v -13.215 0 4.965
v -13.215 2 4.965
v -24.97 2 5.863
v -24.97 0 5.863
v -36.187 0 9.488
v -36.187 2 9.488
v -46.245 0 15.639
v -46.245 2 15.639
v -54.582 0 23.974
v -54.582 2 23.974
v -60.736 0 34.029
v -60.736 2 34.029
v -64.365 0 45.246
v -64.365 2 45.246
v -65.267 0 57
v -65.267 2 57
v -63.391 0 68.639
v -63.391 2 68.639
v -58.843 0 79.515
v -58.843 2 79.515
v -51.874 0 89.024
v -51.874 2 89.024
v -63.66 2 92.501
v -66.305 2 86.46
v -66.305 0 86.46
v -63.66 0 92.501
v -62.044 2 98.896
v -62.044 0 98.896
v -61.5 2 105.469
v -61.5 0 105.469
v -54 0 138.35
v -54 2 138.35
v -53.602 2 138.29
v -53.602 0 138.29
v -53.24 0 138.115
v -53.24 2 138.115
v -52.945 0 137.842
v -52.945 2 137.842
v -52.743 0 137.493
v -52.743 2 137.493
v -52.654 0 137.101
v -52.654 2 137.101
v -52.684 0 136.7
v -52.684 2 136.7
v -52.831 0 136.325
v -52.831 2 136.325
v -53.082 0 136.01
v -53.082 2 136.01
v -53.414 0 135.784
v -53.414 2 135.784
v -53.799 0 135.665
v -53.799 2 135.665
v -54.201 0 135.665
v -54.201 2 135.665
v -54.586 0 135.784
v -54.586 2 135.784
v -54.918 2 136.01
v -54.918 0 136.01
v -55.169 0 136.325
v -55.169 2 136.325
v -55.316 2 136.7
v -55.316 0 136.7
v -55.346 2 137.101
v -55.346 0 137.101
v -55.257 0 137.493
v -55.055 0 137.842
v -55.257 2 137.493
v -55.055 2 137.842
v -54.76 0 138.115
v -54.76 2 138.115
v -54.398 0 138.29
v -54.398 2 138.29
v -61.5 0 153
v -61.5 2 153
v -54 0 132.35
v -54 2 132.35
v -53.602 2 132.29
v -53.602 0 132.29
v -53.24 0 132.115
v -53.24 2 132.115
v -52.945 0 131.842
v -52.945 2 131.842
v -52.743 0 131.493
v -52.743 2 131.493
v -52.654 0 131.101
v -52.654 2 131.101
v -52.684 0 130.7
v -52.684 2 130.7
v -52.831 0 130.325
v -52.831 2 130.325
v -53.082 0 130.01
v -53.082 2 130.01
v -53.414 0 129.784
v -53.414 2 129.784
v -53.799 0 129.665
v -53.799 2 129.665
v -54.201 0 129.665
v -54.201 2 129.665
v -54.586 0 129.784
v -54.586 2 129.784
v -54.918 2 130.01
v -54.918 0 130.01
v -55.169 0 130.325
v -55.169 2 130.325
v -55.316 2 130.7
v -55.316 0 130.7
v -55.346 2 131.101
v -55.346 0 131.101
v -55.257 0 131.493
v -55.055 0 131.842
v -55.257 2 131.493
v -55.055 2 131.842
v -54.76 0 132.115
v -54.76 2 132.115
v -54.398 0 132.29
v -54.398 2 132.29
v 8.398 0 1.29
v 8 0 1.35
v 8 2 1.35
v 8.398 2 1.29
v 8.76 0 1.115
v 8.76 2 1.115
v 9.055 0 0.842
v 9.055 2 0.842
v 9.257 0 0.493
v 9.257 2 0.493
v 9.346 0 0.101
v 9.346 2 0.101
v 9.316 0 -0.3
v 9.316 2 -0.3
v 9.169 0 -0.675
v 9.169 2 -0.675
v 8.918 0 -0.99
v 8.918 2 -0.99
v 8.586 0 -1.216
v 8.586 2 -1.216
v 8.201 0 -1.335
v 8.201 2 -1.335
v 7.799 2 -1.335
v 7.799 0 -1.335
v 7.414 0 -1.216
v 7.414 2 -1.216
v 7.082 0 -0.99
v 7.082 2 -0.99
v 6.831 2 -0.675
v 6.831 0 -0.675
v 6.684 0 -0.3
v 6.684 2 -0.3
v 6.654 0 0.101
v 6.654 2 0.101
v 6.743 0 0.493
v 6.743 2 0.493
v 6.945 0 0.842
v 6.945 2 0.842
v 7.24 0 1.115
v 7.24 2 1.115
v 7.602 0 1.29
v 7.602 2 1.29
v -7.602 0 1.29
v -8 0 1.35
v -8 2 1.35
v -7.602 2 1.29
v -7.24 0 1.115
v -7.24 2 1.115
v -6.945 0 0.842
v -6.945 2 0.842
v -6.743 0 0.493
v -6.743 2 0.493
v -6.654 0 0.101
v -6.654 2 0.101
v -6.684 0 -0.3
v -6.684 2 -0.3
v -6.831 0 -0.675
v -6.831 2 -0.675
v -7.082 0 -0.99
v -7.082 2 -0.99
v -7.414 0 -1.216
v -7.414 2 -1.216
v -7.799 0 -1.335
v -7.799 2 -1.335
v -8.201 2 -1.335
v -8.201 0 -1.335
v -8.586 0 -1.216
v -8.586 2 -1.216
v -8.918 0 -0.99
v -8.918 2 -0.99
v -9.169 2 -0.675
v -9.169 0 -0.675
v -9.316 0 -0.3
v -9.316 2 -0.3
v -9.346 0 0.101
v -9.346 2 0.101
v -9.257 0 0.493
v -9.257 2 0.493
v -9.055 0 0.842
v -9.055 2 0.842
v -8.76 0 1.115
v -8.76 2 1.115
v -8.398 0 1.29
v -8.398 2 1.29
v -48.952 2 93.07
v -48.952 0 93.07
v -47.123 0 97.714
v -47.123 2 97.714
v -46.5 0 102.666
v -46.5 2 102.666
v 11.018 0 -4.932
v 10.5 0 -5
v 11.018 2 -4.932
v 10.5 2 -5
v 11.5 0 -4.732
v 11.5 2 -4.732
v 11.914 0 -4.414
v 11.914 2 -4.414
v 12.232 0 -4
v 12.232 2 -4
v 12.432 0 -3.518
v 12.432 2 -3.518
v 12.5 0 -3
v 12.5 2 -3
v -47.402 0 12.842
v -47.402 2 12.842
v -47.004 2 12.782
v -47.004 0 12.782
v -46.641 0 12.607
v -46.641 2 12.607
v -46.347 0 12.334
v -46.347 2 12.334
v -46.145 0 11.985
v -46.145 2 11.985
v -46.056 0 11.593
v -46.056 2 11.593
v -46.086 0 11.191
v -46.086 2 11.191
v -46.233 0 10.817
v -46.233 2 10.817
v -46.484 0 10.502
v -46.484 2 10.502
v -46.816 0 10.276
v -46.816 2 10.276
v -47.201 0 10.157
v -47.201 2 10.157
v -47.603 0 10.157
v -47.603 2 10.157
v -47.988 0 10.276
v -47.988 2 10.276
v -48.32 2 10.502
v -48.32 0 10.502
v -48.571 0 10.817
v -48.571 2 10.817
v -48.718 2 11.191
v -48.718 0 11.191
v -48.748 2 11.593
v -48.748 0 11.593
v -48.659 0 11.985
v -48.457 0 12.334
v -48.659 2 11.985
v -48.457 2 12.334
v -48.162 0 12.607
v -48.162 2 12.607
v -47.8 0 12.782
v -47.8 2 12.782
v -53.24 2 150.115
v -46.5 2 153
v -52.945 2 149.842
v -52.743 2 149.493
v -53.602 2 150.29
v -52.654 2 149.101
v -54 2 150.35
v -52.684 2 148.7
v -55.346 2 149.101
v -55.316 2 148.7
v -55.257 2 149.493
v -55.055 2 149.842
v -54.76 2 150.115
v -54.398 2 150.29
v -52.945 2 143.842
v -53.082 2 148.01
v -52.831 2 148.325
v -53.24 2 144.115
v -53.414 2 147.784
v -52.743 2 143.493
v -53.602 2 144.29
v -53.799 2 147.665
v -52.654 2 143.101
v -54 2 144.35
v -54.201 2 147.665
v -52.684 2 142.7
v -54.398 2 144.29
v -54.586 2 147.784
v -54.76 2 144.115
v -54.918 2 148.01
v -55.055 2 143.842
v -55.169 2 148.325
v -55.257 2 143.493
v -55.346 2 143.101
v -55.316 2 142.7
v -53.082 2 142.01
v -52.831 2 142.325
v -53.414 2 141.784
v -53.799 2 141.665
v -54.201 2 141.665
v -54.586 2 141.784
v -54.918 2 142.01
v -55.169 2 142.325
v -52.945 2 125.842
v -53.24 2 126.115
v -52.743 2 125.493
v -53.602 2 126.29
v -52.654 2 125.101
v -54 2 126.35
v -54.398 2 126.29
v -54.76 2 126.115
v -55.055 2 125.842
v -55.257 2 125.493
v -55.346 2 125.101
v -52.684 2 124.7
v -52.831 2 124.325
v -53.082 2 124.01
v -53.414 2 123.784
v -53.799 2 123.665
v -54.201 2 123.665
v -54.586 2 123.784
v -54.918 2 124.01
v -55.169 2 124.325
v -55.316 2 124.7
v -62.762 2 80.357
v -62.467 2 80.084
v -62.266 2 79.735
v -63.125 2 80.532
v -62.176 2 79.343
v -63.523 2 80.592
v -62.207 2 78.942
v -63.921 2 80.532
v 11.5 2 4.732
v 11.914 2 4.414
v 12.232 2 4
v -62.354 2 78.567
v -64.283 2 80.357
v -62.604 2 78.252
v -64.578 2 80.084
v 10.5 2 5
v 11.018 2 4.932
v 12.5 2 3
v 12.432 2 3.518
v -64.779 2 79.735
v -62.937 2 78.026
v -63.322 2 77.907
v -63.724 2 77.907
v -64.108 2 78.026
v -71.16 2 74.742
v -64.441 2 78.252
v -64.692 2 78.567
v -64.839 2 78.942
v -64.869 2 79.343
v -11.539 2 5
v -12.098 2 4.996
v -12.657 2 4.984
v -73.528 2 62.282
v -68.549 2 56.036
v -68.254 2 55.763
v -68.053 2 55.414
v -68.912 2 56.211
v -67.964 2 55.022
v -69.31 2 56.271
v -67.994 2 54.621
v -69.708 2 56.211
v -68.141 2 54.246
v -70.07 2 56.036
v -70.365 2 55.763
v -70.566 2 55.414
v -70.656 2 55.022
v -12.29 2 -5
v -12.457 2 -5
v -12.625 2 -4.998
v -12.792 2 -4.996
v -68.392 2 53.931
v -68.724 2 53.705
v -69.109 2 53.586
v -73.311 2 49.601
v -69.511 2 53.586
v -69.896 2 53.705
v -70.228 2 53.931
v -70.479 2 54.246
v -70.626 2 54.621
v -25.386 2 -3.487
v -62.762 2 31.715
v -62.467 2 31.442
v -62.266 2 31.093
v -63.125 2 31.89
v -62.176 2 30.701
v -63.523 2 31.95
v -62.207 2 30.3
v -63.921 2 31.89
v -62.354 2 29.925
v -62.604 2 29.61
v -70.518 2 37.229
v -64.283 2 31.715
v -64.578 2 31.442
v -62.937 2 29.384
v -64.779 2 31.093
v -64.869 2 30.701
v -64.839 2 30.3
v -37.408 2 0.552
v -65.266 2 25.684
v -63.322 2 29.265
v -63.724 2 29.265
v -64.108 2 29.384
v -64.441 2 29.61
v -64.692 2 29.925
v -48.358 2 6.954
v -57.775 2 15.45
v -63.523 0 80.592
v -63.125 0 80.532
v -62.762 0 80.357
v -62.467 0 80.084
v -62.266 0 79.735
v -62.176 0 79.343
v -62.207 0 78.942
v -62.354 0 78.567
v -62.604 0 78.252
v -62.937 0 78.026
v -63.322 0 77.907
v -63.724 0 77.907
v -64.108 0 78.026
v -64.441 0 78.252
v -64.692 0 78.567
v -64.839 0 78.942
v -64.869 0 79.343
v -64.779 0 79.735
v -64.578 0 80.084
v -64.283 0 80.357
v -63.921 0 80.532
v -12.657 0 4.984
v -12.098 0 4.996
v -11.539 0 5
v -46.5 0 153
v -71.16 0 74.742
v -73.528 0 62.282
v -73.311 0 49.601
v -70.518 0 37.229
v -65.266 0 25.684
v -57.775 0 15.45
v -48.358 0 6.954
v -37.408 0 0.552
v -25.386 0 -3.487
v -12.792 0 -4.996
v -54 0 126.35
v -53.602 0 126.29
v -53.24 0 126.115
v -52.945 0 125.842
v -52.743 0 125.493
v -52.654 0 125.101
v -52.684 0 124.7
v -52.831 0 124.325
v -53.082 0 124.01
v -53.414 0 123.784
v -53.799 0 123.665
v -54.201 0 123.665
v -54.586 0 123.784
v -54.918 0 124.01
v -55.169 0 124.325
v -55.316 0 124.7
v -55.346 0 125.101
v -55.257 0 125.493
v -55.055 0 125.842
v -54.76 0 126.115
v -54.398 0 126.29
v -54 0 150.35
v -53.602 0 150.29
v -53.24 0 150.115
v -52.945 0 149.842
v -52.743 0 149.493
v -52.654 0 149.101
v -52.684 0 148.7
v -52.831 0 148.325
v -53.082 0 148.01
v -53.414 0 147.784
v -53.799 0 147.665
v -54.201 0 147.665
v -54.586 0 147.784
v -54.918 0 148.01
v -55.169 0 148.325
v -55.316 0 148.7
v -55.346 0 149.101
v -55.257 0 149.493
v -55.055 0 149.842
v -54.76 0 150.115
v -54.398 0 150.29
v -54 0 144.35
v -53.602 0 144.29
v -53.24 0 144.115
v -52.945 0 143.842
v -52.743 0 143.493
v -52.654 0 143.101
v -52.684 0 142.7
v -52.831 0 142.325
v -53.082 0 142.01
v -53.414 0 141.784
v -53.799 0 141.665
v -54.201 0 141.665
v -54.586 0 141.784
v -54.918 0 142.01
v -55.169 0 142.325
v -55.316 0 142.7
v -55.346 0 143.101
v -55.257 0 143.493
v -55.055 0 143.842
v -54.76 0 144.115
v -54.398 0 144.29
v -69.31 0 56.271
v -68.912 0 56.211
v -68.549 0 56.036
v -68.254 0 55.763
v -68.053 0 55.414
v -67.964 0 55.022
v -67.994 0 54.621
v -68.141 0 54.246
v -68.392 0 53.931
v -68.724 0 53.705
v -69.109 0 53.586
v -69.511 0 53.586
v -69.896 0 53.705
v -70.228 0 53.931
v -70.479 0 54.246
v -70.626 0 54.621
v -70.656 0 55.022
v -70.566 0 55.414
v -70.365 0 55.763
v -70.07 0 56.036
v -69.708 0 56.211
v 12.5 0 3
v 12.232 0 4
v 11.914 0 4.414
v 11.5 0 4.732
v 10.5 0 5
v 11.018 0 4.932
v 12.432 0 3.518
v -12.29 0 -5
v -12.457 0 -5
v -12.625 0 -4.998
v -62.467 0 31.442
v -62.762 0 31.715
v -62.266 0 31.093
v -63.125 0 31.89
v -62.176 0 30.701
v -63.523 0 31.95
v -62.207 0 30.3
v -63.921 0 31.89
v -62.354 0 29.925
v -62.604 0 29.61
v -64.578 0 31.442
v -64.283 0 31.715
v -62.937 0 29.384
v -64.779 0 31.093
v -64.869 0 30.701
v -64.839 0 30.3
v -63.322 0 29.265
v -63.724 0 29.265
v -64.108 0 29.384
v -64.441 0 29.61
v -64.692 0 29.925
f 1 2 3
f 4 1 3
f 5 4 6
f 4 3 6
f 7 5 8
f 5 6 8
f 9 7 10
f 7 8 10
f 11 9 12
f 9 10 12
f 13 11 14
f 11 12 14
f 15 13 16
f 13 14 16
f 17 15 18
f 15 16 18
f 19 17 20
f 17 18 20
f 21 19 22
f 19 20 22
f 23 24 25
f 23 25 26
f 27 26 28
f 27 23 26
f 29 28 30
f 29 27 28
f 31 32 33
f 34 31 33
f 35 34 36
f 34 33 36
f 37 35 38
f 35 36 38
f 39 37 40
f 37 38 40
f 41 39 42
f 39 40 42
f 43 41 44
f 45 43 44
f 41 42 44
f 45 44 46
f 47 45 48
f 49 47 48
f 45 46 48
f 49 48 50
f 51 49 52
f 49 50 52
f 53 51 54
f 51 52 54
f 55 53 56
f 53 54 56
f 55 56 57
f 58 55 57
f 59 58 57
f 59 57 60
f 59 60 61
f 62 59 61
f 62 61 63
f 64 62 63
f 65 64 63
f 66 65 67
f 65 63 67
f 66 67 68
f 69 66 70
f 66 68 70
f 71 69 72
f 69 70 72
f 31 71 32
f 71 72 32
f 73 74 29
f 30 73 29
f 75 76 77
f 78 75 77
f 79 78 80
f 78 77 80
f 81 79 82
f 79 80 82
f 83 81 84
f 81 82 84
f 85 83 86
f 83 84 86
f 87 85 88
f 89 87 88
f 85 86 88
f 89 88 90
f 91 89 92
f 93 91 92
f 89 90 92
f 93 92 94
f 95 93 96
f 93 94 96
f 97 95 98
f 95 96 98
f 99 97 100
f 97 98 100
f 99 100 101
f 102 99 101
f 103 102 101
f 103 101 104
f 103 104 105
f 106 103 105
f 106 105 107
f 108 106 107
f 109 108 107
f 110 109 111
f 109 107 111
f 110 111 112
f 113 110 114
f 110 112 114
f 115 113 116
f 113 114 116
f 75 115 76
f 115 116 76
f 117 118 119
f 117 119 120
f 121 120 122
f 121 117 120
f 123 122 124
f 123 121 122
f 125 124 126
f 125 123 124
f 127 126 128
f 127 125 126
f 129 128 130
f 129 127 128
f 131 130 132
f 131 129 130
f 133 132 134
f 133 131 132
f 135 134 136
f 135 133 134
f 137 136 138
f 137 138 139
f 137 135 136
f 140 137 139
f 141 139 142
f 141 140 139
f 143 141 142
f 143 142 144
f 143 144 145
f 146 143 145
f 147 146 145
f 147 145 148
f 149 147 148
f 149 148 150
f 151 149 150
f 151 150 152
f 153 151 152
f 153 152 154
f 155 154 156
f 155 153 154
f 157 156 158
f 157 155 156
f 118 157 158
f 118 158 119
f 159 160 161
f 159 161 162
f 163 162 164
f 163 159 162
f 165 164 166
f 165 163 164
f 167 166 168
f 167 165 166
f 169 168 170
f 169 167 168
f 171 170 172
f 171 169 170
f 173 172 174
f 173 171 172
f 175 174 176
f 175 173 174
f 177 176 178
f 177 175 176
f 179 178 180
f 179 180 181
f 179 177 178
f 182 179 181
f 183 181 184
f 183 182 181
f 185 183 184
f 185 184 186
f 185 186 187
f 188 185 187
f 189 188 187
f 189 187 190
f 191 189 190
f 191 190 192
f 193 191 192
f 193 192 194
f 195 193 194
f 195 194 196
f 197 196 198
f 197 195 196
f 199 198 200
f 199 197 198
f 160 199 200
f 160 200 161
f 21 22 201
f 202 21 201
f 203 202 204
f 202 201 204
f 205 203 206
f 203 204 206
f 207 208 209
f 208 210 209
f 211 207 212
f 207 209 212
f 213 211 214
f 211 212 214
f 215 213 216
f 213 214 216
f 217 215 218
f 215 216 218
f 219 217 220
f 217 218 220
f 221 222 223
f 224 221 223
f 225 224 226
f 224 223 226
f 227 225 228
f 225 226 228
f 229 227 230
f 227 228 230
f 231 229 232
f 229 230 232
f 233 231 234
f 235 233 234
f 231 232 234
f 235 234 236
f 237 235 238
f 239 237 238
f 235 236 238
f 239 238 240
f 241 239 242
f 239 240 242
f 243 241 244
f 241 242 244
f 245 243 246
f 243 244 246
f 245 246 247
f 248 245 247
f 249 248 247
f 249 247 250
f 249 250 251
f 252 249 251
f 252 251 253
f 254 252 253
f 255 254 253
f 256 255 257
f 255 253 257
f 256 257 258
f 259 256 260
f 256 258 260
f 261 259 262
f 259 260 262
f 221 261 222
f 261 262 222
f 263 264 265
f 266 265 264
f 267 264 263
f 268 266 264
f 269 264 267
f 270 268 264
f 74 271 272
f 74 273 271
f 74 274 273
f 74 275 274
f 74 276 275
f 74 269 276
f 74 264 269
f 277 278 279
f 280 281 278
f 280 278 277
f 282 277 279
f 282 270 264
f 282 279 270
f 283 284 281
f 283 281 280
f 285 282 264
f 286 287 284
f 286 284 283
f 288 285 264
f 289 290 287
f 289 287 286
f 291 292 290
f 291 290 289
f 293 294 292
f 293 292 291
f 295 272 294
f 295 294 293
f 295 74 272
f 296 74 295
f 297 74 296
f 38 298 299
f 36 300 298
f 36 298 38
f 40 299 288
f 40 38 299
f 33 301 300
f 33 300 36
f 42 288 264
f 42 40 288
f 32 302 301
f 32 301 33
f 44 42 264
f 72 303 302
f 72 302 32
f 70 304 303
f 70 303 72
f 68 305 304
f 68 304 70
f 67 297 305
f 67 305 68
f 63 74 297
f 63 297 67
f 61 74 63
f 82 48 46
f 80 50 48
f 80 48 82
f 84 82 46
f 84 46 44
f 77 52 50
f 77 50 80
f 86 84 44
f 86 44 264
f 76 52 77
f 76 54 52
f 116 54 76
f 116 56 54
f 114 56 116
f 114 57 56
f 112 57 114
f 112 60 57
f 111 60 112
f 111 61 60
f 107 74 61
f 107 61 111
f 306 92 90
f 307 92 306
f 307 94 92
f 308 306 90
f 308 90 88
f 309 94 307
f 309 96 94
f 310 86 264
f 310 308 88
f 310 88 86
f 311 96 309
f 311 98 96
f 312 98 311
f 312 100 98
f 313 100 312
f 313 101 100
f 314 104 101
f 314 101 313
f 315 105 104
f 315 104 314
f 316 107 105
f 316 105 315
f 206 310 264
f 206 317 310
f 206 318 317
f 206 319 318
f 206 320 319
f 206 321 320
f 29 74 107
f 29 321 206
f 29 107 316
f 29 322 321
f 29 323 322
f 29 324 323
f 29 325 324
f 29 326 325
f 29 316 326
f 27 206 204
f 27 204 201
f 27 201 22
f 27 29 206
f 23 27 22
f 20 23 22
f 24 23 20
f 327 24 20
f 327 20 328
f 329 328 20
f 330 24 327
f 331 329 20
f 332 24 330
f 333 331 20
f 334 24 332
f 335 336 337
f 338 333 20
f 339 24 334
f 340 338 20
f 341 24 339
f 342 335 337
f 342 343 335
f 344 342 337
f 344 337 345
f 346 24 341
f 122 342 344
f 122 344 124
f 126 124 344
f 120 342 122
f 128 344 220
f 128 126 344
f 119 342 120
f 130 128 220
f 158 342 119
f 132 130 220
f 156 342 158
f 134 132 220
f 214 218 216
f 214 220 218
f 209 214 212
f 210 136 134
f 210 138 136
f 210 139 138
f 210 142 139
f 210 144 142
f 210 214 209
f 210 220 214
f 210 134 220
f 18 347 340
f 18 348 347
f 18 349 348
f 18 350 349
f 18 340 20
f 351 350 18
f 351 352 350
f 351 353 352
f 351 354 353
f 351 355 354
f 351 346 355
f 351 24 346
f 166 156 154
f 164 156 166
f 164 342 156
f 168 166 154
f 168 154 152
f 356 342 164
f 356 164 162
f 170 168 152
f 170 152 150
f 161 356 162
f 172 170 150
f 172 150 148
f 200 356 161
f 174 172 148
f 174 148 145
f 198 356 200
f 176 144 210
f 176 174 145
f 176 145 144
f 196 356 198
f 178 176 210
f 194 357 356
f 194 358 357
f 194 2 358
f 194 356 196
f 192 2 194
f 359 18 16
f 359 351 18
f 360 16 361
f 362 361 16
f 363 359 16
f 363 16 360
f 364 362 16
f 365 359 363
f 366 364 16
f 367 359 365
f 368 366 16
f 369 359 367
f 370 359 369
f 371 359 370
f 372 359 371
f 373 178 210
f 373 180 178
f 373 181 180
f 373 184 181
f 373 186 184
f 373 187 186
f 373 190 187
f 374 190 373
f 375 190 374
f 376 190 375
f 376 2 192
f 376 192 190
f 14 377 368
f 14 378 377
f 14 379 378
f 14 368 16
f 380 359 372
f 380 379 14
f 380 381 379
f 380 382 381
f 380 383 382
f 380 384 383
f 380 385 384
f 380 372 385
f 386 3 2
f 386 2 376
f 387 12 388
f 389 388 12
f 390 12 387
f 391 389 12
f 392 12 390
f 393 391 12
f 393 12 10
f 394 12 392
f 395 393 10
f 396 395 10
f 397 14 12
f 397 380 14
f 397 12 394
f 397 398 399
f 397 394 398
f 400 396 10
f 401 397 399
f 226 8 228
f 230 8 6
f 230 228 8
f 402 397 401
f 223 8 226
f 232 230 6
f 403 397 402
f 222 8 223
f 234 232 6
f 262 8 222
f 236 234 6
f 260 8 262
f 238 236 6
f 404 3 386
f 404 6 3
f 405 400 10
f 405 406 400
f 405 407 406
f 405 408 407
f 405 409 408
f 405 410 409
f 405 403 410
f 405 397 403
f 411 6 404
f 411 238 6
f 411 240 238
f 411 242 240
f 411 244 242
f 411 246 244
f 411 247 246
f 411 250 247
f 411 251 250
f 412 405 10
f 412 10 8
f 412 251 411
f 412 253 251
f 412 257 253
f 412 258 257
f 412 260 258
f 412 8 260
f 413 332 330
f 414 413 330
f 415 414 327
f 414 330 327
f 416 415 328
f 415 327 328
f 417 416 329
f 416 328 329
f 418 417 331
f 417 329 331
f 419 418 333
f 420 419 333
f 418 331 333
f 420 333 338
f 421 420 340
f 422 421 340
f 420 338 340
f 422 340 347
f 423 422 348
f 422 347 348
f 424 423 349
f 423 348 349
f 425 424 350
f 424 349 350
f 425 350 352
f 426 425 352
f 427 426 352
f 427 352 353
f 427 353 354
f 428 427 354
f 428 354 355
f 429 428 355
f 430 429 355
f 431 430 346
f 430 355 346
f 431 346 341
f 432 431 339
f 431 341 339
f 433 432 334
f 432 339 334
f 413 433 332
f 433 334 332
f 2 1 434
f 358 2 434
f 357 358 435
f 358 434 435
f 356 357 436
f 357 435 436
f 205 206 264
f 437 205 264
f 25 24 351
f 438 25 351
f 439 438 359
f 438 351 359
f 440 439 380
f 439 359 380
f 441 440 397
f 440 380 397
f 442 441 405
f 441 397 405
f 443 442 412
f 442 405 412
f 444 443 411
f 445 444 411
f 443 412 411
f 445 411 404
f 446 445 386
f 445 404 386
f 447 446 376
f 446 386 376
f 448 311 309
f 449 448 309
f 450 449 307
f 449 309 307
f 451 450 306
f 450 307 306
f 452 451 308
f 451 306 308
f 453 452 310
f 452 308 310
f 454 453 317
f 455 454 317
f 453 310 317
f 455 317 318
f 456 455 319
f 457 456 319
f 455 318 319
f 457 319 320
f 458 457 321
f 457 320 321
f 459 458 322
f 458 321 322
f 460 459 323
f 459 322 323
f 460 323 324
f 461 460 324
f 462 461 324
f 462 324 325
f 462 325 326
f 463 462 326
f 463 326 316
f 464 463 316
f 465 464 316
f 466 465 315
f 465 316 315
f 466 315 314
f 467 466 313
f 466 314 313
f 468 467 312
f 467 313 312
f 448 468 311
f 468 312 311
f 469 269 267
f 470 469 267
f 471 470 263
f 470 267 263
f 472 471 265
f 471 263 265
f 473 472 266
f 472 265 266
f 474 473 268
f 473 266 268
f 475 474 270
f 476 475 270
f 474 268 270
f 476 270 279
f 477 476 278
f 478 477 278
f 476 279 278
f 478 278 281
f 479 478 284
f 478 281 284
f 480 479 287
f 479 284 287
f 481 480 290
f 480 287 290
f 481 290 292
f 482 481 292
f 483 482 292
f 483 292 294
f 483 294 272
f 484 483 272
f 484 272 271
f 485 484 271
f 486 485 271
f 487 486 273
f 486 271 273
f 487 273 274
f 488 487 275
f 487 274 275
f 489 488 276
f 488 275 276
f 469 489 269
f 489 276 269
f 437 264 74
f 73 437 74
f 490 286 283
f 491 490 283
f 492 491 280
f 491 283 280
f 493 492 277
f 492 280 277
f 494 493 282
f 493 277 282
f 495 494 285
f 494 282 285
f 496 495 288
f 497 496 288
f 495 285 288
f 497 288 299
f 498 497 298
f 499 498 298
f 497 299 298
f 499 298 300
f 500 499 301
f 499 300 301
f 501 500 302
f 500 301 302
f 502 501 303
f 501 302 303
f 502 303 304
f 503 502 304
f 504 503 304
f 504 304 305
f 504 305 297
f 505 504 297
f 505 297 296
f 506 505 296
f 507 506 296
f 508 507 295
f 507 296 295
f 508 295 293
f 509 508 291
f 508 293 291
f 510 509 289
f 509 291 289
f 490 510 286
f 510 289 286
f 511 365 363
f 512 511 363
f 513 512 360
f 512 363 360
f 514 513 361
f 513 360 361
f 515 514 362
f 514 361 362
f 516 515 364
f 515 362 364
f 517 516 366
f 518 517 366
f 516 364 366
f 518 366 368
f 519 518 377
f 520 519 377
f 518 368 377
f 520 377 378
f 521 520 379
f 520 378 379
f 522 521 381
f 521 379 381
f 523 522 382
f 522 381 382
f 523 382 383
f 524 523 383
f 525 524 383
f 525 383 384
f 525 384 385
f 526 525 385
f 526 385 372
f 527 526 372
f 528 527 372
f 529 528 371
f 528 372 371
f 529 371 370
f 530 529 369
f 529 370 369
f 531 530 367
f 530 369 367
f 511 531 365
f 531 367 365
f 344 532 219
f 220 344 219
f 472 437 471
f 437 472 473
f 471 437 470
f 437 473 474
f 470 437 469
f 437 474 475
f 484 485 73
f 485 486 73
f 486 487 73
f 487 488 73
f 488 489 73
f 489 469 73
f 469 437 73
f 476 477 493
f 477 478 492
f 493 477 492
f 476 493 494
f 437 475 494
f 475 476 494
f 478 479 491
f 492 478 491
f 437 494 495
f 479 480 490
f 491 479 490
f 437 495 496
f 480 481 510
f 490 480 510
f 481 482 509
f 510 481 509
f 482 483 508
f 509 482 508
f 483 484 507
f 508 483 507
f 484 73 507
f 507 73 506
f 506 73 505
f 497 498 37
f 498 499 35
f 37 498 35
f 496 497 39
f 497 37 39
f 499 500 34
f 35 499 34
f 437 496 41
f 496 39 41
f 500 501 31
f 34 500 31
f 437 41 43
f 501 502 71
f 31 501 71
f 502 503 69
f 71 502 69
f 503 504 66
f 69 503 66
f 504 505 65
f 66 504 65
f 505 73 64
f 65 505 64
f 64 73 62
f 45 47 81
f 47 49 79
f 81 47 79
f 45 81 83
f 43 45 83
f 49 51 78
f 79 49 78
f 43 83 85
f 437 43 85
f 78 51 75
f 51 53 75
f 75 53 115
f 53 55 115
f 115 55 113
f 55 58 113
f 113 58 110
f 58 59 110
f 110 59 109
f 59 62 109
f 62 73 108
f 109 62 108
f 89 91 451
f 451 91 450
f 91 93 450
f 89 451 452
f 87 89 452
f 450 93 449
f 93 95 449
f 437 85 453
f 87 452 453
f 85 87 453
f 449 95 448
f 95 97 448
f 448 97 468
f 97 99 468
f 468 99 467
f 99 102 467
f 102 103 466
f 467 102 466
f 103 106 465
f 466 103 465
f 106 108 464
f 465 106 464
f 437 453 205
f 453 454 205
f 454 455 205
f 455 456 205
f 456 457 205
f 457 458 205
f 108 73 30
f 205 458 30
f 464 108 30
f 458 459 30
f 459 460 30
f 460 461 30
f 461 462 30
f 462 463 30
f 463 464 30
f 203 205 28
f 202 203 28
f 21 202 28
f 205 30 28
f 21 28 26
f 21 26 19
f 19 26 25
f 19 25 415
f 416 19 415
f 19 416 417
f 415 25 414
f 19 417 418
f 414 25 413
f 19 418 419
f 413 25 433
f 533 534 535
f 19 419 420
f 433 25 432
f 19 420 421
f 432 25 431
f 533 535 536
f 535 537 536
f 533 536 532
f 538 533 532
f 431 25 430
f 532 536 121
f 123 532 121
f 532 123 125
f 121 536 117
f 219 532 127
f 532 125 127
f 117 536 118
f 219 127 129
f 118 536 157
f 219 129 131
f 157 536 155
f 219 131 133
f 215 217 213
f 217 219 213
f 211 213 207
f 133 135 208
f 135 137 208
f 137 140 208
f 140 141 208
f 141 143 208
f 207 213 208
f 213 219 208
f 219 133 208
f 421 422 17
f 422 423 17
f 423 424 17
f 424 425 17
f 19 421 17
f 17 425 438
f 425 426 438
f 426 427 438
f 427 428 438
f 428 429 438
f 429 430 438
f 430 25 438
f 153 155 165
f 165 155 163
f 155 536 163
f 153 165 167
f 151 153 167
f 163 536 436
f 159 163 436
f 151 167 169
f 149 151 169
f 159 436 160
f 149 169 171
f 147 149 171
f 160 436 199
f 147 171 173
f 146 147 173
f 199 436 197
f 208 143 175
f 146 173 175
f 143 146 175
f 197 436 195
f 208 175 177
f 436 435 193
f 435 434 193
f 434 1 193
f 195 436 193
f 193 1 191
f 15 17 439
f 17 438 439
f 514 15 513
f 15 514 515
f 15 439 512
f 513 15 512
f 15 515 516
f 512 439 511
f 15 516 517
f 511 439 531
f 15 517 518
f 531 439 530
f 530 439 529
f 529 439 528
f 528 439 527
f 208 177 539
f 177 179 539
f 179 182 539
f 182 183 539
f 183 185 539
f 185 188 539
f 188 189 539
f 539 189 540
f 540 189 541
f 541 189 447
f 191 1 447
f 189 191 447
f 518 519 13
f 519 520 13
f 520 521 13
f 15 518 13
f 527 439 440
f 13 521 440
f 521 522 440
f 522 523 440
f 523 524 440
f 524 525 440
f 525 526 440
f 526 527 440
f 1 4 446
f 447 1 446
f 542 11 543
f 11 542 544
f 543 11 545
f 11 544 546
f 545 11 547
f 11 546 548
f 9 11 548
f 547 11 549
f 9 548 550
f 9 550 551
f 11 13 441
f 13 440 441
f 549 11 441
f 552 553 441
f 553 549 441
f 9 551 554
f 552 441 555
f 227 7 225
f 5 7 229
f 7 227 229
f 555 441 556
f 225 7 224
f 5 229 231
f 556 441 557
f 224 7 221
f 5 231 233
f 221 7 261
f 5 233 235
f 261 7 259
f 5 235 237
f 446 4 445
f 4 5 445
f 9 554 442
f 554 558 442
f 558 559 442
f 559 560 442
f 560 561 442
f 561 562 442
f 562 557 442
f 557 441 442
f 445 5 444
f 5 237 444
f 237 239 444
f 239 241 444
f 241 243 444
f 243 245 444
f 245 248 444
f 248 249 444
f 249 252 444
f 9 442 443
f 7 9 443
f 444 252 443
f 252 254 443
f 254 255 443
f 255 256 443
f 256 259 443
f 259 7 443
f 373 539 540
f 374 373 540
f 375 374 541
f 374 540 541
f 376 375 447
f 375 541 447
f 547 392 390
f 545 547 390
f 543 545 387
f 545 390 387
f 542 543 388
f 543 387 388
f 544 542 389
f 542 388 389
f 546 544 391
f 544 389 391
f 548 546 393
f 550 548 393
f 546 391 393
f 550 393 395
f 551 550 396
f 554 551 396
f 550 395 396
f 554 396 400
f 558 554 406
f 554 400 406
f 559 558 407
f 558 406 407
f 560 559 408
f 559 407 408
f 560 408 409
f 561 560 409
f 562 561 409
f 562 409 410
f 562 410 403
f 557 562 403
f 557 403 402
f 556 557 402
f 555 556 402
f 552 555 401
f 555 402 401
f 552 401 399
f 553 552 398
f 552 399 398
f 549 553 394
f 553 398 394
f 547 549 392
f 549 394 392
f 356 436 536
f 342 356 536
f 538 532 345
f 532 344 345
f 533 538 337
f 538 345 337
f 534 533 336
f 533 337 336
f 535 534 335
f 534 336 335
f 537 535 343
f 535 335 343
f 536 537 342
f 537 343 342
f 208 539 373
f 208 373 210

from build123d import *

# Parameters (mm, degrees)
SKETCH_1_W      = 25
SKETCH_1_H      = 10
SKETCH_1_R      = 1.35
EXTRUDE_1_DEPTH = 2
SKETCH_3_R      = 1.35
EXTRUDE_2_DEPTH = 2
FILLET_2_R      = 40
FILLET_2_R_2    = 20
FILLET_2_R_3    = 30
FILLET_4_R      = 2


with BuildPart() as part:
    # 草图1 → 凸台-拉伸1 (new body)
    with BuildSketch(Plane(origin=(0, 0, 0), x_dir=(1, 0, 0), z_dir=(0, 1, 0))):
        Rectangle(SKETCH_1_W, SKETCH_1_H)
        with Locations(Location((8, 0, 0), (0, 0, 270))):
            Circle(SKETCH_1_R, mode=Mode.SUBTRACT)
        with Locations(Location((-8, 0, 0), (0, 0, 270))):
            Circle(SKETCH_1_R, mode=Mode.SUBTRACT)
    extrude(amount=EXTRUDE_1_DEPTH)

    # 草图3 → 凸台-拉伸2 (add)
    with BuildSketch(Plane(origin=(0, 2, 0), x_dir=(1, 0, 0), z_dir=(0, 1, 0))):
        with BuildLine():
            Line((-12.5, 5), (-12.5, -5))
            ThreePointArc((-12.5, -5), (-62.017500377, -37.077584126), (-46.5, -94))
            Line((-46.5, -94), (-46.5, -153))
            Line((-46.5, -153), (-61.5, -153))
            Line((-61.5, -153), (-61.5, -94))
            ThreePointArc((-61.5, -94), (-67.320253247, -29.493005969), (-12.5, 5))
        make_face()
        with Locations(Location((-54, -149, 0), (0, 0, 270))):
            Circle(SKETCH_3_R, mode=Mode.SUBTRACT)
        with Locations(Location((-63.522724498, -79.241972734, 0), (0, 0, 270))):
            Circle(SKETCH_3_R, mode=Mode.SUBTRACT)
        with Locations(Location((-47.401976264, -11.491855125, 0), (0, 0, 270))):
            Circle(SKETCH_3_R, mode=Mode.SUBTRACT)
        with Locations(Location((-69.309761535, -54.920989975, 0), (0, 0, 270))):
            Circle(SKETCH_3_R, mode=Mode.SUBTRACT)
        with Locations(Location((-63.522724498, -30.600007217, 0), (0, 0, 270))):
            Circle(SKETCH_3_R, mode=Mode.SUBTRACT)
        with Locations(Location((-54, -143, 0), (0, 0, 270))):
            Circle(SKETCH_3_R, mode=Mode.SUBTRACT)
        with Locations(Location((-54, -137, 0), (0, 0, 270))):
            Circle(SKETCH_3_R, mode=Mode.SUBTRACT)
        with Locations(Location((-54, -131, 0), (0, 0, 270))):
            Circle(SKETCH_3_R, mode=Mode.SUBTRACT)
        with Locations(Location((-54, -125, 0), (0, 0, 270))):
            Circle(SKETCH_3_R, mode=Mode.SUBTRACT)
    extrude(amount=-EXTRUDE_2_DEPTH)

    # 圆角2
    # the kernel refuses this fillet: 40, 30, 20 mm, written as the material it adds along each edge
    with BuildSketch(Plane(origin=(-61.5, 2, 94), x_dir=(0, 0, 1), z_dir=(0, -1, 0))) as fillet_2_piece_1:
        with BuildLine():
            CenterArc((11.468694882, 40), FILLET_2_R, 241.625850179, 28.374149821)
            ThreePointArc((-7.540396677, 4.805477158), (-3.683456175, 2.538847918), (0, 0))
            Line((0, 0), (11.468694882, 0))
        make_face()
    extrude(amount=2)
    # the kernel refuses this fillet: 40, 30, 20 mm, written as the material it takes off along each edge
    with BuildSketch(Plane(origin=(-46.5, 23.664306304, 94), x_dir=(-0.733794554453268, 0, -0.6793714387981952), z_dir=(0, -1, 0))) as fillet_2_2_piece_1:
        with BuildLine():
            CenterArc((8.788646711, -19.946288773), FILLET_2_R_2, 94.200030188, 43.005425253)
            Line((-5.887244378, -6.358859997), (0, 0))
            ThreePointArc((0, 0), (3.66193613, -0.134278068), (7.323872259, 0))
        make_face()
    extrude(amount=45.328612608, mode=Mode.SUBTRACT)
    with BuildSketch(Plane(origin=(-12.5, -2.4014787, 5), x_dir=(1, 0, 0), z_dir=(0, 1, 0))) as fillet_2_2_piece_2:
        with BuildLine():
            CenterArc((0.96059148, 40), FILLET_2_R, 267.599016081, 2.400983919)
            ThreePointArc((-0.715120971, 0.035115567), (-0.357497629, 0.018837835), (0, 0))
            Line((0, 0), (0.96059148, 0))
        make_face()
    extrude(amount=6.8029574, mode=Mode.SUBTRACT)
    with BuildSketch(Plane(origin=(-12.5, -0.73103436, -5), x_dir=(1, 0, 0), z_dir=(0, 1, 0))) as fillet_2_2_piece_3:
        with BuildLine():
            CenterArc((0.210076235, -30), FILLET_2_R_3, 90, 0.959672209)
            ThreePointArc((-0.292383464, -0.004208058), (-0.146194213, -0.001931656), (0, 0))
            Line((0, 0), (0.210076235, 0))
        make_face()
    extrude(amount=3.462068721, mode=Mode.SUBTRACT)

    # 圆角4
    fillet_4_edges = [part.edges().sort_by_distance(p)[0] for p in [
        (12.5, 1, 5),
        (12.5, 1, -5),
    ]]
    fillet(fillet_4_edges, radius=FILLET_4_R)


solid = part.part
